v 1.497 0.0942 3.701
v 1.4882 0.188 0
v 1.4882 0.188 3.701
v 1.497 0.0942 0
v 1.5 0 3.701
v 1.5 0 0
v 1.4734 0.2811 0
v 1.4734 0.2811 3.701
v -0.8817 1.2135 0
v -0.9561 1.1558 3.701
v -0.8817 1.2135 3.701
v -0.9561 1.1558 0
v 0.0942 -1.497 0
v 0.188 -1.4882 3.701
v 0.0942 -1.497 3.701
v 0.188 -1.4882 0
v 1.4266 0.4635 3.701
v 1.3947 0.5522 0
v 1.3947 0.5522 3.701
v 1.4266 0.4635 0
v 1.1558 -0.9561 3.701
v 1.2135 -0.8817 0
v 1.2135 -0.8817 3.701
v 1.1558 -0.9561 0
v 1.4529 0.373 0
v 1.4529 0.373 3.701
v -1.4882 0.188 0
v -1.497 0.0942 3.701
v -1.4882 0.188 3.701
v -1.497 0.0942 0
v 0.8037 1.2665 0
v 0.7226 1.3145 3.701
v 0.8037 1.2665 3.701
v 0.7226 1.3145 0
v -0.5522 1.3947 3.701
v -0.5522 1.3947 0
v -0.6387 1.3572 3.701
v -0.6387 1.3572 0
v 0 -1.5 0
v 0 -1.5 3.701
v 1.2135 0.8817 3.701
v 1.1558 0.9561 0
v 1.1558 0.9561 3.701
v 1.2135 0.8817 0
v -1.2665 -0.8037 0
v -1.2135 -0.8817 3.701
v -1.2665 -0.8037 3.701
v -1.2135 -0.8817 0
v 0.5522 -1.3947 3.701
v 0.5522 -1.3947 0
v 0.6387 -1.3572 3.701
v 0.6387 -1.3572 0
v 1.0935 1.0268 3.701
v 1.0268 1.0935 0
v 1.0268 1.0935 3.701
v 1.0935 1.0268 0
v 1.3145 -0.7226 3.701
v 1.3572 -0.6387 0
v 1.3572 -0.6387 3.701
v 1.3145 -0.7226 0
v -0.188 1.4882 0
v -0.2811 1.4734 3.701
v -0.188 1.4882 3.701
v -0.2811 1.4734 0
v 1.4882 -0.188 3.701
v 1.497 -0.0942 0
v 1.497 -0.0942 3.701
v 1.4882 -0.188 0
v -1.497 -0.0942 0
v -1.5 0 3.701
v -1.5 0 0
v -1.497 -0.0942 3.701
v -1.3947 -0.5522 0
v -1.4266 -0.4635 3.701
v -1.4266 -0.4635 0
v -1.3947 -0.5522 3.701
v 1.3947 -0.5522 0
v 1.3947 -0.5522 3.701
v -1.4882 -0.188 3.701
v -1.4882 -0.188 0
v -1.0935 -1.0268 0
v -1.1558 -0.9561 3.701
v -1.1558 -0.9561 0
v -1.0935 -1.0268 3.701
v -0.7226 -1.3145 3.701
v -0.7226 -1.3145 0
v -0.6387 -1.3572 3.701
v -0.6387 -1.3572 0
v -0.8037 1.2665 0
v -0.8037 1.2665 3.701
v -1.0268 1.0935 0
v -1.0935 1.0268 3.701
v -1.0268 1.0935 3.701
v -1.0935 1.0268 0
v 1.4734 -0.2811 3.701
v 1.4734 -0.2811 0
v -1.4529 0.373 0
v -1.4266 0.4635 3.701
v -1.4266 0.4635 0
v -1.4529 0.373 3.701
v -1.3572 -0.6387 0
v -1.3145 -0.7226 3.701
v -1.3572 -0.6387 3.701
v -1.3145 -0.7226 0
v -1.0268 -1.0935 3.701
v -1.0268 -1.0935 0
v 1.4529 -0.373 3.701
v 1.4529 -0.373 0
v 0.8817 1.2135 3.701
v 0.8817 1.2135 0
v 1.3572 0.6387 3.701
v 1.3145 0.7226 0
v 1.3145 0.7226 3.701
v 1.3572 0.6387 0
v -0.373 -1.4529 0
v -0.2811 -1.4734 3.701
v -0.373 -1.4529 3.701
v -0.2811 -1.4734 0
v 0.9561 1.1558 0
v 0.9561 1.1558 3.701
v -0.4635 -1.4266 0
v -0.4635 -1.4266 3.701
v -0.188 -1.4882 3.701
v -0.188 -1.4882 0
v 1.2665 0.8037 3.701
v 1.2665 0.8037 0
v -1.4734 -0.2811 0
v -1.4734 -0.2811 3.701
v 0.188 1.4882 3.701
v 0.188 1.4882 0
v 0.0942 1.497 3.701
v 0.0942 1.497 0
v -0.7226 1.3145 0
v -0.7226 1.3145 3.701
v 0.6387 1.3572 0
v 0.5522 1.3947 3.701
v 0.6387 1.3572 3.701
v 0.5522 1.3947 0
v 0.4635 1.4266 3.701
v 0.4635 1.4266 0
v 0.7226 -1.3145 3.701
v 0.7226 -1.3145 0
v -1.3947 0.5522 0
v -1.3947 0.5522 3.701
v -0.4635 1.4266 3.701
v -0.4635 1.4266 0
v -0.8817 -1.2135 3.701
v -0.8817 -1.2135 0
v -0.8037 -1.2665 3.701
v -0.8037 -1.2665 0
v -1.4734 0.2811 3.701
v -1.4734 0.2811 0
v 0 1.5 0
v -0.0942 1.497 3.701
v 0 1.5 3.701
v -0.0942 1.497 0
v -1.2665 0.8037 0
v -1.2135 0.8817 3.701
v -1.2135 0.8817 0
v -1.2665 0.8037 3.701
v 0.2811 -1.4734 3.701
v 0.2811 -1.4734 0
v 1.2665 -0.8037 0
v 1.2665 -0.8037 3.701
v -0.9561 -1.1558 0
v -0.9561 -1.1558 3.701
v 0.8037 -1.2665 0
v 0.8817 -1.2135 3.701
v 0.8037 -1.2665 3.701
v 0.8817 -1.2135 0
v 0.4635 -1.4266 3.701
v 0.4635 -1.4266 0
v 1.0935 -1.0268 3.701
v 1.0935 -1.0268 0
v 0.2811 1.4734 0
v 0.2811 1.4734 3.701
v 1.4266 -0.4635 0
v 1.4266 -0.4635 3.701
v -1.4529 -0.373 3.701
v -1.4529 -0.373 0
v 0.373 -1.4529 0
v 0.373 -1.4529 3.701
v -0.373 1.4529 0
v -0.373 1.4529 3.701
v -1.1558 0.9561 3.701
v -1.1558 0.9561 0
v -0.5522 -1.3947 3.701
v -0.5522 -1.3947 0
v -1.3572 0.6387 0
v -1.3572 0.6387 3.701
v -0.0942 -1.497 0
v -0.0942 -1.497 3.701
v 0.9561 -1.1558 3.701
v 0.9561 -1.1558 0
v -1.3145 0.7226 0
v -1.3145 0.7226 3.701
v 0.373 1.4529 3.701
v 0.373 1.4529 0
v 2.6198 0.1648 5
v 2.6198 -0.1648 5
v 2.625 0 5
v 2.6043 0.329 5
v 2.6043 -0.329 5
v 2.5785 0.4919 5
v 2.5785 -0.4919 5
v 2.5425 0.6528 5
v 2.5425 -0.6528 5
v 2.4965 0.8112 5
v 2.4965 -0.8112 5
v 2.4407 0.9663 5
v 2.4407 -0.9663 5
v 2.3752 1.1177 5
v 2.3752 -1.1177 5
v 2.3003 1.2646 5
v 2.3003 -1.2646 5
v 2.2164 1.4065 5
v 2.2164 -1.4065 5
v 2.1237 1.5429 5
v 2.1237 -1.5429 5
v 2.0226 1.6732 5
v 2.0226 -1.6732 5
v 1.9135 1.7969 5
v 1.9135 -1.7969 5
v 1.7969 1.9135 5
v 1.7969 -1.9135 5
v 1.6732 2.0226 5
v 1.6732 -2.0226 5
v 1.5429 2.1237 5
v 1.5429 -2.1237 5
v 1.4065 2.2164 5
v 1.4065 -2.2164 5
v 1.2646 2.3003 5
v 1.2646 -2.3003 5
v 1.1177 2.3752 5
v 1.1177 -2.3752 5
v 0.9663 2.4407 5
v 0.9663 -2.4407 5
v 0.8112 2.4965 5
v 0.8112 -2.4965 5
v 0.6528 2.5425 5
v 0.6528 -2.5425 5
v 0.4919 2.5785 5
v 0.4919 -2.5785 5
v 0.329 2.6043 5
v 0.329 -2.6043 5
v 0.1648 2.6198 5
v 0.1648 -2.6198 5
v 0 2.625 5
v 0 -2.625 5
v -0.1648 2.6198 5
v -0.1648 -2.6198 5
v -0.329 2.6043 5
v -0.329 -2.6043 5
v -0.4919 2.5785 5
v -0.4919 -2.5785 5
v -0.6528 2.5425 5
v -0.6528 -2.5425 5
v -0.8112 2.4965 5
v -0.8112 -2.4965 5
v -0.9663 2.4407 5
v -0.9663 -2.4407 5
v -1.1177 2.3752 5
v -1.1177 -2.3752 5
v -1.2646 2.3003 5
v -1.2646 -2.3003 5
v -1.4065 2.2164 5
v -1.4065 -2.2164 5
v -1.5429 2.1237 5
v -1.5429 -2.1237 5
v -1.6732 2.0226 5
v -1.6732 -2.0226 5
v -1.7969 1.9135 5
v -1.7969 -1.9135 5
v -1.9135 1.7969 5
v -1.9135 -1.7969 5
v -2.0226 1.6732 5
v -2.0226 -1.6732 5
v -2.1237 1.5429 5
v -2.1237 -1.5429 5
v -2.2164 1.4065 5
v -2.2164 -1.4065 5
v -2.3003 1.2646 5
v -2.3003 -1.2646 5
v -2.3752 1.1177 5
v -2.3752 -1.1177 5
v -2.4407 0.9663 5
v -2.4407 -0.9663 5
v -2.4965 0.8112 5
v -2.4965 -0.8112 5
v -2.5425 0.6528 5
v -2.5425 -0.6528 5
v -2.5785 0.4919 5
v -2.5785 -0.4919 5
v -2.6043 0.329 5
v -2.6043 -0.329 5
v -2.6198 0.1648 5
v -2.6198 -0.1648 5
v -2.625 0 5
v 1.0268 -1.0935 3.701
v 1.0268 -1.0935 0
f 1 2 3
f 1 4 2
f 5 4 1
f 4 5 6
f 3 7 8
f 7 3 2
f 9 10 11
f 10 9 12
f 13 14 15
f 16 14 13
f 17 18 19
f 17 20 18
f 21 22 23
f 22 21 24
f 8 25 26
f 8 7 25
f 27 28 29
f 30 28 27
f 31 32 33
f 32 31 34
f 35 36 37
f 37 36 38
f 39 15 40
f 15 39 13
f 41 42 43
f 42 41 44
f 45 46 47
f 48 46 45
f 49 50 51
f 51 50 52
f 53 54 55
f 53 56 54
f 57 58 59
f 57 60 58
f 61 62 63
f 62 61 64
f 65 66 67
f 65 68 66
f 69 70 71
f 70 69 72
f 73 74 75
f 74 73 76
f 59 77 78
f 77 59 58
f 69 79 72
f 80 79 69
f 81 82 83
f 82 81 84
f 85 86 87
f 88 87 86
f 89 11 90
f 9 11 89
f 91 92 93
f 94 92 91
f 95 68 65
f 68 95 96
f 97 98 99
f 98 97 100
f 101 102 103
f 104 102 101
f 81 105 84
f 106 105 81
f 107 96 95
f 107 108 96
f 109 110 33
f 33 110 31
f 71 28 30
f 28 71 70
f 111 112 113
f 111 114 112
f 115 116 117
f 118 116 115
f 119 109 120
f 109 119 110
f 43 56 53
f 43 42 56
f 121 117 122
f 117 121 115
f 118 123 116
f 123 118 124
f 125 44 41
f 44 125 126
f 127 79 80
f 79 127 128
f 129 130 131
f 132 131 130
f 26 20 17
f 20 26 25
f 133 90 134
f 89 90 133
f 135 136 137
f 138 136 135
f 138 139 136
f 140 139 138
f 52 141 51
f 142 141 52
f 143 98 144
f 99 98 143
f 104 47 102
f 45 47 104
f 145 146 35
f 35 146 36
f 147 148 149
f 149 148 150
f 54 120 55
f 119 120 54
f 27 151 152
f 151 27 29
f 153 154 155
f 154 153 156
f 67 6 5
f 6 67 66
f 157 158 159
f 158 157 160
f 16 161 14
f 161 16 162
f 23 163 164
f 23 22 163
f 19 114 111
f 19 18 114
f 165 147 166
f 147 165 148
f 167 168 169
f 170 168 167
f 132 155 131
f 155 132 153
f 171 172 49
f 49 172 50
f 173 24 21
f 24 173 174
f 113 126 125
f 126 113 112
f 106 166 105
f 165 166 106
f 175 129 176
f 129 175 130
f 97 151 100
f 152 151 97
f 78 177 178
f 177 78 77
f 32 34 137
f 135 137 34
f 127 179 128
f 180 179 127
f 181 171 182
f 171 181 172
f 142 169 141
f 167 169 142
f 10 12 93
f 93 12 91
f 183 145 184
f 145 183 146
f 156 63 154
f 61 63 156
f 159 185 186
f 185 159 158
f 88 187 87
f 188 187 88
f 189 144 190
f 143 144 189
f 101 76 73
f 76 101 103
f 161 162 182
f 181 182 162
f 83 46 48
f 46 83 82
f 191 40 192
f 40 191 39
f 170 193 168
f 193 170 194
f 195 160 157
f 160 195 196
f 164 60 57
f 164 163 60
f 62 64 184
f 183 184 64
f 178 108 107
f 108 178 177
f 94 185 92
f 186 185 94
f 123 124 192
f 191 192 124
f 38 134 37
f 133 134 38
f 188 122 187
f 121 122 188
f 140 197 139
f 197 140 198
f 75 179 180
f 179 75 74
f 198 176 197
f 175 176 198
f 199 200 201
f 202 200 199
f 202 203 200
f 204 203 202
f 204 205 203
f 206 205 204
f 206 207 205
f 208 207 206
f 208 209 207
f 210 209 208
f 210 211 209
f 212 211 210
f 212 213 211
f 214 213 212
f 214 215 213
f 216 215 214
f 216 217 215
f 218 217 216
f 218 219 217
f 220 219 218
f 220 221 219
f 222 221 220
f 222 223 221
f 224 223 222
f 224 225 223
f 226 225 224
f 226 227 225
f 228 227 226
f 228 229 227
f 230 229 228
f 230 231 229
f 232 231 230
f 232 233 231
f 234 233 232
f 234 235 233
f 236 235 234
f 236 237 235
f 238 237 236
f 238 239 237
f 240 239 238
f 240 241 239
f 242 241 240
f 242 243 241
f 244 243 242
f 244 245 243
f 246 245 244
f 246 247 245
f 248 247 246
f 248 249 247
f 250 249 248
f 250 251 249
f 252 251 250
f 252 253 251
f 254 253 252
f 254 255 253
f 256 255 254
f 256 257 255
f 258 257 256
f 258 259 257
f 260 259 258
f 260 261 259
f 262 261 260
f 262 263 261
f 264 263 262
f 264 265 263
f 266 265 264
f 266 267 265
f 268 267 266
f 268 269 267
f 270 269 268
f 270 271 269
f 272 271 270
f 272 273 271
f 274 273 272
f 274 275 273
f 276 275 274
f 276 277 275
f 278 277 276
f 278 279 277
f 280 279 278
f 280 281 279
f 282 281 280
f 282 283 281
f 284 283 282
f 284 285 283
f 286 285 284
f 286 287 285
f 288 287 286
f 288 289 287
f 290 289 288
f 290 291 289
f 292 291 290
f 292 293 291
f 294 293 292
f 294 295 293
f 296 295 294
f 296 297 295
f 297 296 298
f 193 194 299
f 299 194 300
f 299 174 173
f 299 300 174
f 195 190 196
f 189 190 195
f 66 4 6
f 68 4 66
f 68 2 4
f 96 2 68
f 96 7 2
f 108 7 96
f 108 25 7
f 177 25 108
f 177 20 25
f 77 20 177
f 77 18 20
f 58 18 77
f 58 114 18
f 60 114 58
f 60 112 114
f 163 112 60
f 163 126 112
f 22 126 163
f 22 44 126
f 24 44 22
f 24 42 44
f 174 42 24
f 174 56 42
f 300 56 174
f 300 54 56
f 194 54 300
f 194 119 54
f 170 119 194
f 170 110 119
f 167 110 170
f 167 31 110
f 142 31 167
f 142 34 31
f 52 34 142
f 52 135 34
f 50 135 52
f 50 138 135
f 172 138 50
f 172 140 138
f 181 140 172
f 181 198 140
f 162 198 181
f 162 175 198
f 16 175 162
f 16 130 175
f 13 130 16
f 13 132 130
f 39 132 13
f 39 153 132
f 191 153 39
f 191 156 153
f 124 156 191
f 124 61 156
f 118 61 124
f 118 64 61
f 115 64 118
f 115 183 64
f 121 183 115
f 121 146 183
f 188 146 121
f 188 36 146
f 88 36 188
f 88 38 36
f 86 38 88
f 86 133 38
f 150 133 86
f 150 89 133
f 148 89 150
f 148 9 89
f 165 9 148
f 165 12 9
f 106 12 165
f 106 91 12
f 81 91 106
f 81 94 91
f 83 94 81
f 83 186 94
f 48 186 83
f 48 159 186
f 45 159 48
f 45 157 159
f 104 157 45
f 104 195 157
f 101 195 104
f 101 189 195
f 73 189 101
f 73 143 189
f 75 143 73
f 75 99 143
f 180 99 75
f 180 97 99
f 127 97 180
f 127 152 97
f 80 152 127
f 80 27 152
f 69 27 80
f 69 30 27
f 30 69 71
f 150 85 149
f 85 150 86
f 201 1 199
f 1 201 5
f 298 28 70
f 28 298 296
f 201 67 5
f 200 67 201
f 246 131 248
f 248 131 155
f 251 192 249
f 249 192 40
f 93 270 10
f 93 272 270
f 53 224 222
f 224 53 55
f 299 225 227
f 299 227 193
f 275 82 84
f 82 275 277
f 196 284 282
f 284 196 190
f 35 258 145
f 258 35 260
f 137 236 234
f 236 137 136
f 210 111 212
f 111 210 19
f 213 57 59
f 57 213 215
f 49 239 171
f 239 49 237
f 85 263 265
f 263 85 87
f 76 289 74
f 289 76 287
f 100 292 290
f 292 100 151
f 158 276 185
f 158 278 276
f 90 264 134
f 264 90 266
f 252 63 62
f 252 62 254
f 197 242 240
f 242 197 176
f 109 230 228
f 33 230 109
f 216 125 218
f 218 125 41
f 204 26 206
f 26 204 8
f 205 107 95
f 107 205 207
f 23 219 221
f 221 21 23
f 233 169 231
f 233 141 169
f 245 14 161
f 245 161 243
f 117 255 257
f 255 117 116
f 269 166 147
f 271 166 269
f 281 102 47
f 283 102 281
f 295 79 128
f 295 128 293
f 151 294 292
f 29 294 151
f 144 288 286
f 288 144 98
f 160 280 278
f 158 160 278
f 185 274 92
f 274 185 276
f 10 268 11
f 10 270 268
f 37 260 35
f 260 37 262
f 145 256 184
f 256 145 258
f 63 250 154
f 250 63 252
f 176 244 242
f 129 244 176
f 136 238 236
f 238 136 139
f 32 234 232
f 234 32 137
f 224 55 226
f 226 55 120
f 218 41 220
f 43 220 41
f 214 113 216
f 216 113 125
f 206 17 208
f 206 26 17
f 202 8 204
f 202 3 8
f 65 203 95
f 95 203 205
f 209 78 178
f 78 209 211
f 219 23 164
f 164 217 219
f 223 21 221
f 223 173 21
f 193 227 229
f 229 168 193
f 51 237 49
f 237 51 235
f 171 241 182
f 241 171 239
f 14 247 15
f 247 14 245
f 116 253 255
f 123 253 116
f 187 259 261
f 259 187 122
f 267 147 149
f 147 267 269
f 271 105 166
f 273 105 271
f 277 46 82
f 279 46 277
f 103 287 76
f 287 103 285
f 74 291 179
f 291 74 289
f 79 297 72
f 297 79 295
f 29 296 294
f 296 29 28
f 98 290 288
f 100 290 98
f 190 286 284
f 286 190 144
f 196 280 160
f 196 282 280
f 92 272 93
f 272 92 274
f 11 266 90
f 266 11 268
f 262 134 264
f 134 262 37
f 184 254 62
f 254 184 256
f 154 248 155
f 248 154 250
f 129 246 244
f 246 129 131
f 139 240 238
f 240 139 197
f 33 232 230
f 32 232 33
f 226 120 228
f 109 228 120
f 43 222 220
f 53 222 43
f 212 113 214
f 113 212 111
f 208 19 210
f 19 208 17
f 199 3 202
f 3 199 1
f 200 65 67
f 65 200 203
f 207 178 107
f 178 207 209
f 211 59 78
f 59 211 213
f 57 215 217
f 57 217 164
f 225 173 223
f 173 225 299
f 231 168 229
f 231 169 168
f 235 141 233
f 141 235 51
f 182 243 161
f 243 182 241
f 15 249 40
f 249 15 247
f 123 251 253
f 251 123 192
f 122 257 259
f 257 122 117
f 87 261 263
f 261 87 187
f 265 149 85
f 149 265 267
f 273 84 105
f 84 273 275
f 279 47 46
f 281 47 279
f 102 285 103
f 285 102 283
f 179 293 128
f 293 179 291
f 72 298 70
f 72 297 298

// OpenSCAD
// file: ../math/vect.scad
function vect_scalar_sum(v, incr) = [for (i = [0: len(v) - 1]) v[i] + incr];

function vSize(size) = (!is_list(size)) ? [size, size, size]: size; 


function vect_2d_to_3d(vect, z = 0) = [vect[0], vect[1], z];

function vect_rotate2d(vect, b) = [
    cos(b) * vect[0] - sin(b) * vect[1],
    sin(b) * vect[0] + cos(b) * vect[1]
];

function round_vect(v) = [for (i = [0: len(v) - 1]) round(v[i])];

function vect_swap_xy(v1) = [v1.y, v1.x, v1.z];

function vectorize_2(x) = is_list(x) ? [x.x, x.y] : [x, x];

function vectorize_3(x) = is_list(x) ? [x.x, x.y, x.z] : [x, x, x];

echo (vectorize_3(1));
// file: ../math/align.scad
use <vect.scad>
module align_center(sizes, center = true, centerZ = false, vector=[1, 1, 0]){
    xxx=vector.x;
    yyy=vector.y;
    zzz=centerZ || vector.z;
    sizes = vSize(sizes);
    if (center){
        translate([xxx ? -sizes[0] / 2 : 0, yyy ? -sizes[1] / 2: 0, zzz ? -sizes[2]/2 : 0]){
            children();
        }
    } else {
        children();
    }   
}

module align_uncenter(sizes, uncenter = true, uncenterZ = false){
    sizes = vSize(sizes);
    if (uncenter){
        translate([sizes[0] / 2, sizes[1] / 2, (uncenterZ ? sizes[2]/2 : 0)]){
            children();
        }
    } else {
        children();
    }   
}

ALIGN_LEFT=[1, 0, 0];
ALIGN_RIGHT=[-1, 0, 0];
ALIGN_BOTTOM=[0, 0, -1];
ALIGN_TOP=[0, 0, 1];
ALIGN_BACK=[0, -1, 0];
ALIGN_FWD=[0, 1, 0];

function _aligner(target, source, align) = 
            align > 0 ? target * align:
            align < 0 ? source * align:
            (target - source) / 2;    

function aligner(target_sizes, source_sizes, vector) = [
    vector.x == undef ? 0 : _aligner(target_sizes.x, source_sizes.x, vector.x),
    vector.y == undef ? 0 : _aligner(target_sizes.y, source_sizes.y, vector.y),
    vector.z == undef ? 0 : _aligner(target_sizes.z, source_sizes.z, vector.z)
];

module align_relative(
    target_sizes, 
    source_sizes, 
    vector=[0,0,undef]
    ){
        
    // x = vector.x == undef ? 0 : _aligner(target_sizes.y, source_sizes.x, vector.x);
    // y = vector.y == undef ? 0 : _aligner(target_sizes.y, source_sizes.y, vector.y);
    // z = vector.z == undef ? 0 : _aligner(target_sizes.z, source_sizes.z, vector.z);
    to_translate = aligner(target_sizes, source_sizes, vector);
    echo(to_translate);
    translate(to_translate)
        children();
}

module align_center_source_vs_target(target_sizes, source_sizes, centerZ = false){
    align_relative(target_sizes=target_sizes, source_sizes=source_sizes, vector=[0, 0, centerZ ? 1 : 0])
        children();
}


module zz(z){
    translate([0, 0, z])
        children();
}

module xx(x){
    translate([x, 0, 0])
        children();
}

module yy(y){
    translate([0, y, 0])
        children();
}

module rz(z){
    rotate([0, 0, z])
        children();
}

module rx(x){
    rotate([x, 0, 0])
        children();
}

module ry(y){
    rotate([0, y, 0])
        children();
}

module zc(){
    translate([0, 0, -0.01])
        children();
}
module xc(){
    translate([-0.01, 0, 0])    
        children();
}
module yc(){
    translate([0, -0.01, 0])
        children();
}

// align_center_source_vs_target([100, 100, 1], [10, 10, 10], centerZ = false){
//     cube([100,100,1]);
//     cube([10,10,10]);
// }

// align_center(20){
//     align_uncenter(20){
//         cube(20);
//     }
// }

// target_sizes = [20, 20, 20];
// source_sizes = [10, 10, 10];
// color("azure",0.25)
//     cube(size=target_sizes);
// align_relative(target_sizes=target_sizes, source_sizes=source_sizes, vector=[0, 0, undef]){
//     color("red",0.25)
//         zz(20)
//         cube(size=source_sizes);
// }
// main file
use <../math/align.scad>

module screw_hole(d, h, chamferD = undef, chamferA = 30, mirrorZ = false){
    chamferD = is_undef(chamferD) ? d * 1.75: chamferD;
    chamferH = chamferD * tan(chamferA);

    module _m(){
        cylinder(d = d, h = h);
        zz(h - chamferH)
        cylinder(r2 = chamferD / 2, r1 = 0,  h = chamferH);
    }

    if (mirrorZ){
        translate([0, 0, h]) mirror([0, 0, 1]) 
            _m();
    } else {
        _m();
    }
}


module screw_holes(size, d, positions=[1,1,1,1], chamferD = undef, chamferA = 30){
    module _h(){
        screw_hole(d = d, h = size.z, chamferD, chamferA);
    }
    if (positions[0])
        xx(size.x)
            _h();
    if (positions[1])
        yy(size.y)
            _h();
    if (positions[2])
        yy(size.y)
        xx(size.x)
            _h();
    if (positions[3])
        _h();
}

module four_screw_holes(size, d, chamferD = undef, chamferA = 30){
    module _h(){
        screw_hole(d = d, h = size.z, chamferD, chamferA);
    }
    xx(size.x)
        _h();
    yy(size.y)
        _h();
    yy(size.y)
    xx(size.x)
        _h();
    _h();
}

$fn=100;
screw_hole(3, 5);
//four_screw_holes([100, 100, 10], 10, 15);
